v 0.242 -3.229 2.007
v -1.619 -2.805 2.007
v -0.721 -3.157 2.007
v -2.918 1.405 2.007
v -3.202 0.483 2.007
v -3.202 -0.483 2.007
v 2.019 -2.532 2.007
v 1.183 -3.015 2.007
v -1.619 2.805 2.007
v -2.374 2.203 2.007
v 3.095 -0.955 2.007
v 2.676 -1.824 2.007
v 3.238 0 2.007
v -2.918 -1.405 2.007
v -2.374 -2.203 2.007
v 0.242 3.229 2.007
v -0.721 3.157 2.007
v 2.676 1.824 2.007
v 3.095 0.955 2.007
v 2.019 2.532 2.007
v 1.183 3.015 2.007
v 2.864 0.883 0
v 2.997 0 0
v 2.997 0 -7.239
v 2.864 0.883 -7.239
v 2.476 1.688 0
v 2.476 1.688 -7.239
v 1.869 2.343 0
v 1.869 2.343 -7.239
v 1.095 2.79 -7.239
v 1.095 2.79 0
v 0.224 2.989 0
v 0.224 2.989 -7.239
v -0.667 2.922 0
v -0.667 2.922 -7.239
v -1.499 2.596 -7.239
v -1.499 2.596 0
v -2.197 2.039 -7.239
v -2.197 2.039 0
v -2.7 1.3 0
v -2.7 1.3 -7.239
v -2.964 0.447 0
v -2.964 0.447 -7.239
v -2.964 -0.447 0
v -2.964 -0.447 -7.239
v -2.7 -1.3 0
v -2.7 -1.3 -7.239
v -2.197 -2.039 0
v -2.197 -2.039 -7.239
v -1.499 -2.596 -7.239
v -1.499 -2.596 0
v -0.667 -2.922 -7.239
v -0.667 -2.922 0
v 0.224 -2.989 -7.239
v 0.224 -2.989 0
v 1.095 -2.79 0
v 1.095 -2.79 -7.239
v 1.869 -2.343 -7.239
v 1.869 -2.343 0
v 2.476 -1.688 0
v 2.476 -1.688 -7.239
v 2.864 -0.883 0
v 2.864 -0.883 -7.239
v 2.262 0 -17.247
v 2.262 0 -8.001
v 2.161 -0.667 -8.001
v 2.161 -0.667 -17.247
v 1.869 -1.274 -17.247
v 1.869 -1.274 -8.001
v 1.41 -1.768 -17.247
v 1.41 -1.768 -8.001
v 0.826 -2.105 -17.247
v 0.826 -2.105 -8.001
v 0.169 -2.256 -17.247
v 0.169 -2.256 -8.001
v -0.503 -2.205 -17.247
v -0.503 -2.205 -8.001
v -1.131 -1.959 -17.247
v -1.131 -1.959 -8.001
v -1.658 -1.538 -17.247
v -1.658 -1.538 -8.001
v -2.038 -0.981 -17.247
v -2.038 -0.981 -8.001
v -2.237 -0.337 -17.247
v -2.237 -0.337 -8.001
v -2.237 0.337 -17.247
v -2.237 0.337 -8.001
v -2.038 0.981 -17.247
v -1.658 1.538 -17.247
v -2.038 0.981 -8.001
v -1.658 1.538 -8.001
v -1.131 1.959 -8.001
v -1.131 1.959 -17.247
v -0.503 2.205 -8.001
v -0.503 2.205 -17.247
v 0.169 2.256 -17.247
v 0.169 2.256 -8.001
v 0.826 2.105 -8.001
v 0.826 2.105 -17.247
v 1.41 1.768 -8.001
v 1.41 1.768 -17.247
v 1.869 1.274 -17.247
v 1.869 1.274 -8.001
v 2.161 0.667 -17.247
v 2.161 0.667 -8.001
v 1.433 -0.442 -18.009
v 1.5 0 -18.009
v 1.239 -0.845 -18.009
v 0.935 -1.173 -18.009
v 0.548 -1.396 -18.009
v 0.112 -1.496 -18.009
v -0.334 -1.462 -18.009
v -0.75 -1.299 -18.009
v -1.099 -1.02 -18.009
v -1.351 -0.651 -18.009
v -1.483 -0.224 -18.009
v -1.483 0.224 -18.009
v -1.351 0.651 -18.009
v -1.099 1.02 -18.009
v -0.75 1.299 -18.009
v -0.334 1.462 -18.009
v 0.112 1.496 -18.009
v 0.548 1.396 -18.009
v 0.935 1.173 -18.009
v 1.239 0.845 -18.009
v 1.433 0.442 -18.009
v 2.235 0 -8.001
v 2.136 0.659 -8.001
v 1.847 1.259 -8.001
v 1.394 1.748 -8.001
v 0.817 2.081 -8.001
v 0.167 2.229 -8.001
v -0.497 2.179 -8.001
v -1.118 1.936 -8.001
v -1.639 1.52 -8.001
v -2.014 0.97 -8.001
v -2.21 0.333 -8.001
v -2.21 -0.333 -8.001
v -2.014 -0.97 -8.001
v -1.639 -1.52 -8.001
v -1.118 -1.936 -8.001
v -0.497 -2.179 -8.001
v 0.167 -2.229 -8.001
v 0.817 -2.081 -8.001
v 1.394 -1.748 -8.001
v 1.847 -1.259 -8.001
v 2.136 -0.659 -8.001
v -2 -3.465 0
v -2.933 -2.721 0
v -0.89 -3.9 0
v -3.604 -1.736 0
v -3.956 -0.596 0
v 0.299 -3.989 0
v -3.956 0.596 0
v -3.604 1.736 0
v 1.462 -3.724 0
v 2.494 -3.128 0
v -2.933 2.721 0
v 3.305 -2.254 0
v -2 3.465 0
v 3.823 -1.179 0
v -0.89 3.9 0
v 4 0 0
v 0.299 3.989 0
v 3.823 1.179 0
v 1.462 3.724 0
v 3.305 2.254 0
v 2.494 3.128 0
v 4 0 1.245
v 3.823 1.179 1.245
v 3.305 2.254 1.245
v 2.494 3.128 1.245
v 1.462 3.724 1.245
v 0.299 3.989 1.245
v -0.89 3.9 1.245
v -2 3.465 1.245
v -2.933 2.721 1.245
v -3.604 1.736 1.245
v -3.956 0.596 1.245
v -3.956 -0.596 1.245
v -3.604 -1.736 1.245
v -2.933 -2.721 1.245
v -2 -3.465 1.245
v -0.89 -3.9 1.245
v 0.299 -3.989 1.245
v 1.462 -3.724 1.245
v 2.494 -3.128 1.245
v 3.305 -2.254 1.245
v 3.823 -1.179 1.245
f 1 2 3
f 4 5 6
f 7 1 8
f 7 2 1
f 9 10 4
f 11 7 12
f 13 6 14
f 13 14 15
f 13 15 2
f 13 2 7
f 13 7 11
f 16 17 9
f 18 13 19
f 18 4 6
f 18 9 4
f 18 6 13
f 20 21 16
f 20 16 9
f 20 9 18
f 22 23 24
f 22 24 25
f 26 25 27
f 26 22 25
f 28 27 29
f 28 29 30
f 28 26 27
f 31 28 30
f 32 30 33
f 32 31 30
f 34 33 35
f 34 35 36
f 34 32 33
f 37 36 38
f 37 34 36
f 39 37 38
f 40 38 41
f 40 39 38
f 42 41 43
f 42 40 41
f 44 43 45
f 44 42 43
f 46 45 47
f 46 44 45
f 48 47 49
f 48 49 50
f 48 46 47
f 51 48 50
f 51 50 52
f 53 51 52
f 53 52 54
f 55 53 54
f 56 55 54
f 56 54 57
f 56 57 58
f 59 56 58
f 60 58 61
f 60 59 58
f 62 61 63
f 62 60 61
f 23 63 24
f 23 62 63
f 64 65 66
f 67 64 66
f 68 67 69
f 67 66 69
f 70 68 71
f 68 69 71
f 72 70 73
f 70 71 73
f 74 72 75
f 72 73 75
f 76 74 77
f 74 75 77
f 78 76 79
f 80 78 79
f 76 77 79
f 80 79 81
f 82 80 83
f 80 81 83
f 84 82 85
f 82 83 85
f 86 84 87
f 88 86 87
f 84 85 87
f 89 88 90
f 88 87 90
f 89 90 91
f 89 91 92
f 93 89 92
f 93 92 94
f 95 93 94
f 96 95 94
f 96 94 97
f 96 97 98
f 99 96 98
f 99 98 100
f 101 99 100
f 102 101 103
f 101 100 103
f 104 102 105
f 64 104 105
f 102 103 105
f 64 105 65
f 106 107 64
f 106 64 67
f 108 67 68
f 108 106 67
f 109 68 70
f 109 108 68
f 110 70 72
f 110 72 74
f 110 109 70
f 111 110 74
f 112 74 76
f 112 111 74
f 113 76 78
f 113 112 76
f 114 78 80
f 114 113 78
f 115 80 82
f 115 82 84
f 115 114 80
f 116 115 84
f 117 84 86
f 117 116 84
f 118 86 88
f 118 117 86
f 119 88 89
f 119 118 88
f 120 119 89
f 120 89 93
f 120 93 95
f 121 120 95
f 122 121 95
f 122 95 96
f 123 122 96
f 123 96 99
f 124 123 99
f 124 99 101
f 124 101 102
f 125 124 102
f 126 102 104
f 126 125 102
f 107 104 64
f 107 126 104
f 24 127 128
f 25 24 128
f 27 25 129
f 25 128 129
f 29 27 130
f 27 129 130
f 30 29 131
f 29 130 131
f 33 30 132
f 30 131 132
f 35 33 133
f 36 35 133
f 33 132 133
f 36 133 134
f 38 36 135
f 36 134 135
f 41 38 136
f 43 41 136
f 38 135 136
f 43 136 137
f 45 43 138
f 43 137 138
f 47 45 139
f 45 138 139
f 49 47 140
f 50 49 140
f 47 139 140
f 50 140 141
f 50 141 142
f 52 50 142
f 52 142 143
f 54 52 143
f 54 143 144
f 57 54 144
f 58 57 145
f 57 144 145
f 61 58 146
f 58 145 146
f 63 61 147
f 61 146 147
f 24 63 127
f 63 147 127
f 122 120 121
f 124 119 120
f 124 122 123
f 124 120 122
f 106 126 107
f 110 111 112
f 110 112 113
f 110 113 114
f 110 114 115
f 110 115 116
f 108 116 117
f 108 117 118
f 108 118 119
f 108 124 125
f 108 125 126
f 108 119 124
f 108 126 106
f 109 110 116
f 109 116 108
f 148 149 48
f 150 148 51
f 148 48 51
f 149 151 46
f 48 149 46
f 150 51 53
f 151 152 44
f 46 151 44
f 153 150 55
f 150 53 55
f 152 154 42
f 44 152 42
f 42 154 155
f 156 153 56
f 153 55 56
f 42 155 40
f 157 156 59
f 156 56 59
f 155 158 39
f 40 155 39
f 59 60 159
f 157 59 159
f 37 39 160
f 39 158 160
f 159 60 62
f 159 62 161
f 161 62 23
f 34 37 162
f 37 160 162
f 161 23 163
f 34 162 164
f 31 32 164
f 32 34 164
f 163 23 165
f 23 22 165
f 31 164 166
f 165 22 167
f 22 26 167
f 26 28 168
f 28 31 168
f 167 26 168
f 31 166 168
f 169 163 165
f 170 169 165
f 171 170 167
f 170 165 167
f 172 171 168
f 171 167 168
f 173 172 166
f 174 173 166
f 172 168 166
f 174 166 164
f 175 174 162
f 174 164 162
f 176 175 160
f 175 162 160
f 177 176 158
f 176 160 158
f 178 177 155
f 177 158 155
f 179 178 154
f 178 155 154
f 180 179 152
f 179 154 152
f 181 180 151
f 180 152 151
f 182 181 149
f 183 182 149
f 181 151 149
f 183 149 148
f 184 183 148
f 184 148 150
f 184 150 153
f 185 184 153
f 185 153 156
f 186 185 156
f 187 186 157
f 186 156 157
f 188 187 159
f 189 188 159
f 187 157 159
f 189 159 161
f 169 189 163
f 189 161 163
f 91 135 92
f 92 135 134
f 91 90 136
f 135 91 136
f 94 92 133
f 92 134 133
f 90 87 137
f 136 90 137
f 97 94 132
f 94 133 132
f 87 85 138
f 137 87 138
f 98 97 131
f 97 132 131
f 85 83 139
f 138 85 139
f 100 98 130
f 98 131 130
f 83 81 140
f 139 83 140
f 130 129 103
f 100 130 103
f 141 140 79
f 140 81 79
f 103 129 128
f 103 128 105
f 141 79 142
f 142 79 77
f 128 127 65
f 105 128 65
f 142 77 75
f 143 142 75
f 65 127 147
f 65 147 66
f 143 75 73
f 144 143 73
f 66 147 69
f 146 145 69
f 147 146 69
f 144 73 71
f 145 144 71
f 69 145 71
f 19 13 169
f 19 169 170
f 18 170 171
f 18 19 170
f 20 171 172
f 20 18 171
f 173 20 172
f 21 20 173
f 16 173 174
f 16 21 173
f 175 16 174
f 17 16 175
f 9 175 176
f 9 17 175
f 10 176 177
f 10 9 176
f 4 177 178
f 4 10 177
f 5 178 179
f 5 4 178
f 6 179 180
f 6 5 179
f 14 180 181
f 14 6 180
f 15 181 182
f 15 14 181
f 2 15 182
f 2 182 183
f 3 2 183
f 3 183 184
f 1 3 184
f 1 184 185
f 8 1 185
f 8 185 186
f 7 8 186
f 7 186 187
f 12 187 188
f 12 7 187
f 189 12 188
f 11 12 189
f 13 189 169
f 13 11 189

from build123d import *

# Parameters (mm, degrees)
F0_R     = 4.0005
F0_R_2   = 2.9972
F1_DEPTH = 2.0066
F2_SIZE  = 0.762
F3_DEPTH = 8.001
F5_SIZE  = 0.762
F4_R     = 2.261837
F6_DEPTH = 10.0076
F7_SIZE  = 0.762


with BuildPart() as f1:
    # F0 (on Top) → F1 (new body)
    with BuildSketch(Plane.XY):
        Circle(F0_R)
        Circle(F0_R_2, mode=Mode.SUBTRACT)
        Circle(F0_R_2)
    extrude(amount=F1_DEPTH)

    # F2
    f2_edges = [f1.edges().sort_by_distance(p)[0] for p in [
        (-4.0005, 0, 2.0066),
    ]]
    chamfer(f2_edges, length=F2_SIZE)

    # F0 (on Top) → F3 (join)
    with BuildSketch(Plane.XY):
        Circle(F0_R_2)
    extrude(amount=-F3_DEPTH)

    # F5
    f5_edges = [f1.edges().sort_by_distance(p)[0] for p in [
        (-2.9972, 0, -8.001),
    ]]
    chamfer(f5_edges, length=F5_SIZE)

    # F4 (on face) → F6 (join)
    with BuildSketch(Plane(origin=(0, 0, -8.001), x_dir=(1, 0, 0), z_dir=(0, 0, -1))):
        Circle(F4_R)
    extrude(amount=F6_DEPTH)

    # F7
    f7_edges = [f1.edges().sort_by_distance(p)[0] for p in [
        (-2.261837, 0, -18.0086),
    ]]
    chamfer(f7_edges, length=F7_SIZE)


solid = f1.part
